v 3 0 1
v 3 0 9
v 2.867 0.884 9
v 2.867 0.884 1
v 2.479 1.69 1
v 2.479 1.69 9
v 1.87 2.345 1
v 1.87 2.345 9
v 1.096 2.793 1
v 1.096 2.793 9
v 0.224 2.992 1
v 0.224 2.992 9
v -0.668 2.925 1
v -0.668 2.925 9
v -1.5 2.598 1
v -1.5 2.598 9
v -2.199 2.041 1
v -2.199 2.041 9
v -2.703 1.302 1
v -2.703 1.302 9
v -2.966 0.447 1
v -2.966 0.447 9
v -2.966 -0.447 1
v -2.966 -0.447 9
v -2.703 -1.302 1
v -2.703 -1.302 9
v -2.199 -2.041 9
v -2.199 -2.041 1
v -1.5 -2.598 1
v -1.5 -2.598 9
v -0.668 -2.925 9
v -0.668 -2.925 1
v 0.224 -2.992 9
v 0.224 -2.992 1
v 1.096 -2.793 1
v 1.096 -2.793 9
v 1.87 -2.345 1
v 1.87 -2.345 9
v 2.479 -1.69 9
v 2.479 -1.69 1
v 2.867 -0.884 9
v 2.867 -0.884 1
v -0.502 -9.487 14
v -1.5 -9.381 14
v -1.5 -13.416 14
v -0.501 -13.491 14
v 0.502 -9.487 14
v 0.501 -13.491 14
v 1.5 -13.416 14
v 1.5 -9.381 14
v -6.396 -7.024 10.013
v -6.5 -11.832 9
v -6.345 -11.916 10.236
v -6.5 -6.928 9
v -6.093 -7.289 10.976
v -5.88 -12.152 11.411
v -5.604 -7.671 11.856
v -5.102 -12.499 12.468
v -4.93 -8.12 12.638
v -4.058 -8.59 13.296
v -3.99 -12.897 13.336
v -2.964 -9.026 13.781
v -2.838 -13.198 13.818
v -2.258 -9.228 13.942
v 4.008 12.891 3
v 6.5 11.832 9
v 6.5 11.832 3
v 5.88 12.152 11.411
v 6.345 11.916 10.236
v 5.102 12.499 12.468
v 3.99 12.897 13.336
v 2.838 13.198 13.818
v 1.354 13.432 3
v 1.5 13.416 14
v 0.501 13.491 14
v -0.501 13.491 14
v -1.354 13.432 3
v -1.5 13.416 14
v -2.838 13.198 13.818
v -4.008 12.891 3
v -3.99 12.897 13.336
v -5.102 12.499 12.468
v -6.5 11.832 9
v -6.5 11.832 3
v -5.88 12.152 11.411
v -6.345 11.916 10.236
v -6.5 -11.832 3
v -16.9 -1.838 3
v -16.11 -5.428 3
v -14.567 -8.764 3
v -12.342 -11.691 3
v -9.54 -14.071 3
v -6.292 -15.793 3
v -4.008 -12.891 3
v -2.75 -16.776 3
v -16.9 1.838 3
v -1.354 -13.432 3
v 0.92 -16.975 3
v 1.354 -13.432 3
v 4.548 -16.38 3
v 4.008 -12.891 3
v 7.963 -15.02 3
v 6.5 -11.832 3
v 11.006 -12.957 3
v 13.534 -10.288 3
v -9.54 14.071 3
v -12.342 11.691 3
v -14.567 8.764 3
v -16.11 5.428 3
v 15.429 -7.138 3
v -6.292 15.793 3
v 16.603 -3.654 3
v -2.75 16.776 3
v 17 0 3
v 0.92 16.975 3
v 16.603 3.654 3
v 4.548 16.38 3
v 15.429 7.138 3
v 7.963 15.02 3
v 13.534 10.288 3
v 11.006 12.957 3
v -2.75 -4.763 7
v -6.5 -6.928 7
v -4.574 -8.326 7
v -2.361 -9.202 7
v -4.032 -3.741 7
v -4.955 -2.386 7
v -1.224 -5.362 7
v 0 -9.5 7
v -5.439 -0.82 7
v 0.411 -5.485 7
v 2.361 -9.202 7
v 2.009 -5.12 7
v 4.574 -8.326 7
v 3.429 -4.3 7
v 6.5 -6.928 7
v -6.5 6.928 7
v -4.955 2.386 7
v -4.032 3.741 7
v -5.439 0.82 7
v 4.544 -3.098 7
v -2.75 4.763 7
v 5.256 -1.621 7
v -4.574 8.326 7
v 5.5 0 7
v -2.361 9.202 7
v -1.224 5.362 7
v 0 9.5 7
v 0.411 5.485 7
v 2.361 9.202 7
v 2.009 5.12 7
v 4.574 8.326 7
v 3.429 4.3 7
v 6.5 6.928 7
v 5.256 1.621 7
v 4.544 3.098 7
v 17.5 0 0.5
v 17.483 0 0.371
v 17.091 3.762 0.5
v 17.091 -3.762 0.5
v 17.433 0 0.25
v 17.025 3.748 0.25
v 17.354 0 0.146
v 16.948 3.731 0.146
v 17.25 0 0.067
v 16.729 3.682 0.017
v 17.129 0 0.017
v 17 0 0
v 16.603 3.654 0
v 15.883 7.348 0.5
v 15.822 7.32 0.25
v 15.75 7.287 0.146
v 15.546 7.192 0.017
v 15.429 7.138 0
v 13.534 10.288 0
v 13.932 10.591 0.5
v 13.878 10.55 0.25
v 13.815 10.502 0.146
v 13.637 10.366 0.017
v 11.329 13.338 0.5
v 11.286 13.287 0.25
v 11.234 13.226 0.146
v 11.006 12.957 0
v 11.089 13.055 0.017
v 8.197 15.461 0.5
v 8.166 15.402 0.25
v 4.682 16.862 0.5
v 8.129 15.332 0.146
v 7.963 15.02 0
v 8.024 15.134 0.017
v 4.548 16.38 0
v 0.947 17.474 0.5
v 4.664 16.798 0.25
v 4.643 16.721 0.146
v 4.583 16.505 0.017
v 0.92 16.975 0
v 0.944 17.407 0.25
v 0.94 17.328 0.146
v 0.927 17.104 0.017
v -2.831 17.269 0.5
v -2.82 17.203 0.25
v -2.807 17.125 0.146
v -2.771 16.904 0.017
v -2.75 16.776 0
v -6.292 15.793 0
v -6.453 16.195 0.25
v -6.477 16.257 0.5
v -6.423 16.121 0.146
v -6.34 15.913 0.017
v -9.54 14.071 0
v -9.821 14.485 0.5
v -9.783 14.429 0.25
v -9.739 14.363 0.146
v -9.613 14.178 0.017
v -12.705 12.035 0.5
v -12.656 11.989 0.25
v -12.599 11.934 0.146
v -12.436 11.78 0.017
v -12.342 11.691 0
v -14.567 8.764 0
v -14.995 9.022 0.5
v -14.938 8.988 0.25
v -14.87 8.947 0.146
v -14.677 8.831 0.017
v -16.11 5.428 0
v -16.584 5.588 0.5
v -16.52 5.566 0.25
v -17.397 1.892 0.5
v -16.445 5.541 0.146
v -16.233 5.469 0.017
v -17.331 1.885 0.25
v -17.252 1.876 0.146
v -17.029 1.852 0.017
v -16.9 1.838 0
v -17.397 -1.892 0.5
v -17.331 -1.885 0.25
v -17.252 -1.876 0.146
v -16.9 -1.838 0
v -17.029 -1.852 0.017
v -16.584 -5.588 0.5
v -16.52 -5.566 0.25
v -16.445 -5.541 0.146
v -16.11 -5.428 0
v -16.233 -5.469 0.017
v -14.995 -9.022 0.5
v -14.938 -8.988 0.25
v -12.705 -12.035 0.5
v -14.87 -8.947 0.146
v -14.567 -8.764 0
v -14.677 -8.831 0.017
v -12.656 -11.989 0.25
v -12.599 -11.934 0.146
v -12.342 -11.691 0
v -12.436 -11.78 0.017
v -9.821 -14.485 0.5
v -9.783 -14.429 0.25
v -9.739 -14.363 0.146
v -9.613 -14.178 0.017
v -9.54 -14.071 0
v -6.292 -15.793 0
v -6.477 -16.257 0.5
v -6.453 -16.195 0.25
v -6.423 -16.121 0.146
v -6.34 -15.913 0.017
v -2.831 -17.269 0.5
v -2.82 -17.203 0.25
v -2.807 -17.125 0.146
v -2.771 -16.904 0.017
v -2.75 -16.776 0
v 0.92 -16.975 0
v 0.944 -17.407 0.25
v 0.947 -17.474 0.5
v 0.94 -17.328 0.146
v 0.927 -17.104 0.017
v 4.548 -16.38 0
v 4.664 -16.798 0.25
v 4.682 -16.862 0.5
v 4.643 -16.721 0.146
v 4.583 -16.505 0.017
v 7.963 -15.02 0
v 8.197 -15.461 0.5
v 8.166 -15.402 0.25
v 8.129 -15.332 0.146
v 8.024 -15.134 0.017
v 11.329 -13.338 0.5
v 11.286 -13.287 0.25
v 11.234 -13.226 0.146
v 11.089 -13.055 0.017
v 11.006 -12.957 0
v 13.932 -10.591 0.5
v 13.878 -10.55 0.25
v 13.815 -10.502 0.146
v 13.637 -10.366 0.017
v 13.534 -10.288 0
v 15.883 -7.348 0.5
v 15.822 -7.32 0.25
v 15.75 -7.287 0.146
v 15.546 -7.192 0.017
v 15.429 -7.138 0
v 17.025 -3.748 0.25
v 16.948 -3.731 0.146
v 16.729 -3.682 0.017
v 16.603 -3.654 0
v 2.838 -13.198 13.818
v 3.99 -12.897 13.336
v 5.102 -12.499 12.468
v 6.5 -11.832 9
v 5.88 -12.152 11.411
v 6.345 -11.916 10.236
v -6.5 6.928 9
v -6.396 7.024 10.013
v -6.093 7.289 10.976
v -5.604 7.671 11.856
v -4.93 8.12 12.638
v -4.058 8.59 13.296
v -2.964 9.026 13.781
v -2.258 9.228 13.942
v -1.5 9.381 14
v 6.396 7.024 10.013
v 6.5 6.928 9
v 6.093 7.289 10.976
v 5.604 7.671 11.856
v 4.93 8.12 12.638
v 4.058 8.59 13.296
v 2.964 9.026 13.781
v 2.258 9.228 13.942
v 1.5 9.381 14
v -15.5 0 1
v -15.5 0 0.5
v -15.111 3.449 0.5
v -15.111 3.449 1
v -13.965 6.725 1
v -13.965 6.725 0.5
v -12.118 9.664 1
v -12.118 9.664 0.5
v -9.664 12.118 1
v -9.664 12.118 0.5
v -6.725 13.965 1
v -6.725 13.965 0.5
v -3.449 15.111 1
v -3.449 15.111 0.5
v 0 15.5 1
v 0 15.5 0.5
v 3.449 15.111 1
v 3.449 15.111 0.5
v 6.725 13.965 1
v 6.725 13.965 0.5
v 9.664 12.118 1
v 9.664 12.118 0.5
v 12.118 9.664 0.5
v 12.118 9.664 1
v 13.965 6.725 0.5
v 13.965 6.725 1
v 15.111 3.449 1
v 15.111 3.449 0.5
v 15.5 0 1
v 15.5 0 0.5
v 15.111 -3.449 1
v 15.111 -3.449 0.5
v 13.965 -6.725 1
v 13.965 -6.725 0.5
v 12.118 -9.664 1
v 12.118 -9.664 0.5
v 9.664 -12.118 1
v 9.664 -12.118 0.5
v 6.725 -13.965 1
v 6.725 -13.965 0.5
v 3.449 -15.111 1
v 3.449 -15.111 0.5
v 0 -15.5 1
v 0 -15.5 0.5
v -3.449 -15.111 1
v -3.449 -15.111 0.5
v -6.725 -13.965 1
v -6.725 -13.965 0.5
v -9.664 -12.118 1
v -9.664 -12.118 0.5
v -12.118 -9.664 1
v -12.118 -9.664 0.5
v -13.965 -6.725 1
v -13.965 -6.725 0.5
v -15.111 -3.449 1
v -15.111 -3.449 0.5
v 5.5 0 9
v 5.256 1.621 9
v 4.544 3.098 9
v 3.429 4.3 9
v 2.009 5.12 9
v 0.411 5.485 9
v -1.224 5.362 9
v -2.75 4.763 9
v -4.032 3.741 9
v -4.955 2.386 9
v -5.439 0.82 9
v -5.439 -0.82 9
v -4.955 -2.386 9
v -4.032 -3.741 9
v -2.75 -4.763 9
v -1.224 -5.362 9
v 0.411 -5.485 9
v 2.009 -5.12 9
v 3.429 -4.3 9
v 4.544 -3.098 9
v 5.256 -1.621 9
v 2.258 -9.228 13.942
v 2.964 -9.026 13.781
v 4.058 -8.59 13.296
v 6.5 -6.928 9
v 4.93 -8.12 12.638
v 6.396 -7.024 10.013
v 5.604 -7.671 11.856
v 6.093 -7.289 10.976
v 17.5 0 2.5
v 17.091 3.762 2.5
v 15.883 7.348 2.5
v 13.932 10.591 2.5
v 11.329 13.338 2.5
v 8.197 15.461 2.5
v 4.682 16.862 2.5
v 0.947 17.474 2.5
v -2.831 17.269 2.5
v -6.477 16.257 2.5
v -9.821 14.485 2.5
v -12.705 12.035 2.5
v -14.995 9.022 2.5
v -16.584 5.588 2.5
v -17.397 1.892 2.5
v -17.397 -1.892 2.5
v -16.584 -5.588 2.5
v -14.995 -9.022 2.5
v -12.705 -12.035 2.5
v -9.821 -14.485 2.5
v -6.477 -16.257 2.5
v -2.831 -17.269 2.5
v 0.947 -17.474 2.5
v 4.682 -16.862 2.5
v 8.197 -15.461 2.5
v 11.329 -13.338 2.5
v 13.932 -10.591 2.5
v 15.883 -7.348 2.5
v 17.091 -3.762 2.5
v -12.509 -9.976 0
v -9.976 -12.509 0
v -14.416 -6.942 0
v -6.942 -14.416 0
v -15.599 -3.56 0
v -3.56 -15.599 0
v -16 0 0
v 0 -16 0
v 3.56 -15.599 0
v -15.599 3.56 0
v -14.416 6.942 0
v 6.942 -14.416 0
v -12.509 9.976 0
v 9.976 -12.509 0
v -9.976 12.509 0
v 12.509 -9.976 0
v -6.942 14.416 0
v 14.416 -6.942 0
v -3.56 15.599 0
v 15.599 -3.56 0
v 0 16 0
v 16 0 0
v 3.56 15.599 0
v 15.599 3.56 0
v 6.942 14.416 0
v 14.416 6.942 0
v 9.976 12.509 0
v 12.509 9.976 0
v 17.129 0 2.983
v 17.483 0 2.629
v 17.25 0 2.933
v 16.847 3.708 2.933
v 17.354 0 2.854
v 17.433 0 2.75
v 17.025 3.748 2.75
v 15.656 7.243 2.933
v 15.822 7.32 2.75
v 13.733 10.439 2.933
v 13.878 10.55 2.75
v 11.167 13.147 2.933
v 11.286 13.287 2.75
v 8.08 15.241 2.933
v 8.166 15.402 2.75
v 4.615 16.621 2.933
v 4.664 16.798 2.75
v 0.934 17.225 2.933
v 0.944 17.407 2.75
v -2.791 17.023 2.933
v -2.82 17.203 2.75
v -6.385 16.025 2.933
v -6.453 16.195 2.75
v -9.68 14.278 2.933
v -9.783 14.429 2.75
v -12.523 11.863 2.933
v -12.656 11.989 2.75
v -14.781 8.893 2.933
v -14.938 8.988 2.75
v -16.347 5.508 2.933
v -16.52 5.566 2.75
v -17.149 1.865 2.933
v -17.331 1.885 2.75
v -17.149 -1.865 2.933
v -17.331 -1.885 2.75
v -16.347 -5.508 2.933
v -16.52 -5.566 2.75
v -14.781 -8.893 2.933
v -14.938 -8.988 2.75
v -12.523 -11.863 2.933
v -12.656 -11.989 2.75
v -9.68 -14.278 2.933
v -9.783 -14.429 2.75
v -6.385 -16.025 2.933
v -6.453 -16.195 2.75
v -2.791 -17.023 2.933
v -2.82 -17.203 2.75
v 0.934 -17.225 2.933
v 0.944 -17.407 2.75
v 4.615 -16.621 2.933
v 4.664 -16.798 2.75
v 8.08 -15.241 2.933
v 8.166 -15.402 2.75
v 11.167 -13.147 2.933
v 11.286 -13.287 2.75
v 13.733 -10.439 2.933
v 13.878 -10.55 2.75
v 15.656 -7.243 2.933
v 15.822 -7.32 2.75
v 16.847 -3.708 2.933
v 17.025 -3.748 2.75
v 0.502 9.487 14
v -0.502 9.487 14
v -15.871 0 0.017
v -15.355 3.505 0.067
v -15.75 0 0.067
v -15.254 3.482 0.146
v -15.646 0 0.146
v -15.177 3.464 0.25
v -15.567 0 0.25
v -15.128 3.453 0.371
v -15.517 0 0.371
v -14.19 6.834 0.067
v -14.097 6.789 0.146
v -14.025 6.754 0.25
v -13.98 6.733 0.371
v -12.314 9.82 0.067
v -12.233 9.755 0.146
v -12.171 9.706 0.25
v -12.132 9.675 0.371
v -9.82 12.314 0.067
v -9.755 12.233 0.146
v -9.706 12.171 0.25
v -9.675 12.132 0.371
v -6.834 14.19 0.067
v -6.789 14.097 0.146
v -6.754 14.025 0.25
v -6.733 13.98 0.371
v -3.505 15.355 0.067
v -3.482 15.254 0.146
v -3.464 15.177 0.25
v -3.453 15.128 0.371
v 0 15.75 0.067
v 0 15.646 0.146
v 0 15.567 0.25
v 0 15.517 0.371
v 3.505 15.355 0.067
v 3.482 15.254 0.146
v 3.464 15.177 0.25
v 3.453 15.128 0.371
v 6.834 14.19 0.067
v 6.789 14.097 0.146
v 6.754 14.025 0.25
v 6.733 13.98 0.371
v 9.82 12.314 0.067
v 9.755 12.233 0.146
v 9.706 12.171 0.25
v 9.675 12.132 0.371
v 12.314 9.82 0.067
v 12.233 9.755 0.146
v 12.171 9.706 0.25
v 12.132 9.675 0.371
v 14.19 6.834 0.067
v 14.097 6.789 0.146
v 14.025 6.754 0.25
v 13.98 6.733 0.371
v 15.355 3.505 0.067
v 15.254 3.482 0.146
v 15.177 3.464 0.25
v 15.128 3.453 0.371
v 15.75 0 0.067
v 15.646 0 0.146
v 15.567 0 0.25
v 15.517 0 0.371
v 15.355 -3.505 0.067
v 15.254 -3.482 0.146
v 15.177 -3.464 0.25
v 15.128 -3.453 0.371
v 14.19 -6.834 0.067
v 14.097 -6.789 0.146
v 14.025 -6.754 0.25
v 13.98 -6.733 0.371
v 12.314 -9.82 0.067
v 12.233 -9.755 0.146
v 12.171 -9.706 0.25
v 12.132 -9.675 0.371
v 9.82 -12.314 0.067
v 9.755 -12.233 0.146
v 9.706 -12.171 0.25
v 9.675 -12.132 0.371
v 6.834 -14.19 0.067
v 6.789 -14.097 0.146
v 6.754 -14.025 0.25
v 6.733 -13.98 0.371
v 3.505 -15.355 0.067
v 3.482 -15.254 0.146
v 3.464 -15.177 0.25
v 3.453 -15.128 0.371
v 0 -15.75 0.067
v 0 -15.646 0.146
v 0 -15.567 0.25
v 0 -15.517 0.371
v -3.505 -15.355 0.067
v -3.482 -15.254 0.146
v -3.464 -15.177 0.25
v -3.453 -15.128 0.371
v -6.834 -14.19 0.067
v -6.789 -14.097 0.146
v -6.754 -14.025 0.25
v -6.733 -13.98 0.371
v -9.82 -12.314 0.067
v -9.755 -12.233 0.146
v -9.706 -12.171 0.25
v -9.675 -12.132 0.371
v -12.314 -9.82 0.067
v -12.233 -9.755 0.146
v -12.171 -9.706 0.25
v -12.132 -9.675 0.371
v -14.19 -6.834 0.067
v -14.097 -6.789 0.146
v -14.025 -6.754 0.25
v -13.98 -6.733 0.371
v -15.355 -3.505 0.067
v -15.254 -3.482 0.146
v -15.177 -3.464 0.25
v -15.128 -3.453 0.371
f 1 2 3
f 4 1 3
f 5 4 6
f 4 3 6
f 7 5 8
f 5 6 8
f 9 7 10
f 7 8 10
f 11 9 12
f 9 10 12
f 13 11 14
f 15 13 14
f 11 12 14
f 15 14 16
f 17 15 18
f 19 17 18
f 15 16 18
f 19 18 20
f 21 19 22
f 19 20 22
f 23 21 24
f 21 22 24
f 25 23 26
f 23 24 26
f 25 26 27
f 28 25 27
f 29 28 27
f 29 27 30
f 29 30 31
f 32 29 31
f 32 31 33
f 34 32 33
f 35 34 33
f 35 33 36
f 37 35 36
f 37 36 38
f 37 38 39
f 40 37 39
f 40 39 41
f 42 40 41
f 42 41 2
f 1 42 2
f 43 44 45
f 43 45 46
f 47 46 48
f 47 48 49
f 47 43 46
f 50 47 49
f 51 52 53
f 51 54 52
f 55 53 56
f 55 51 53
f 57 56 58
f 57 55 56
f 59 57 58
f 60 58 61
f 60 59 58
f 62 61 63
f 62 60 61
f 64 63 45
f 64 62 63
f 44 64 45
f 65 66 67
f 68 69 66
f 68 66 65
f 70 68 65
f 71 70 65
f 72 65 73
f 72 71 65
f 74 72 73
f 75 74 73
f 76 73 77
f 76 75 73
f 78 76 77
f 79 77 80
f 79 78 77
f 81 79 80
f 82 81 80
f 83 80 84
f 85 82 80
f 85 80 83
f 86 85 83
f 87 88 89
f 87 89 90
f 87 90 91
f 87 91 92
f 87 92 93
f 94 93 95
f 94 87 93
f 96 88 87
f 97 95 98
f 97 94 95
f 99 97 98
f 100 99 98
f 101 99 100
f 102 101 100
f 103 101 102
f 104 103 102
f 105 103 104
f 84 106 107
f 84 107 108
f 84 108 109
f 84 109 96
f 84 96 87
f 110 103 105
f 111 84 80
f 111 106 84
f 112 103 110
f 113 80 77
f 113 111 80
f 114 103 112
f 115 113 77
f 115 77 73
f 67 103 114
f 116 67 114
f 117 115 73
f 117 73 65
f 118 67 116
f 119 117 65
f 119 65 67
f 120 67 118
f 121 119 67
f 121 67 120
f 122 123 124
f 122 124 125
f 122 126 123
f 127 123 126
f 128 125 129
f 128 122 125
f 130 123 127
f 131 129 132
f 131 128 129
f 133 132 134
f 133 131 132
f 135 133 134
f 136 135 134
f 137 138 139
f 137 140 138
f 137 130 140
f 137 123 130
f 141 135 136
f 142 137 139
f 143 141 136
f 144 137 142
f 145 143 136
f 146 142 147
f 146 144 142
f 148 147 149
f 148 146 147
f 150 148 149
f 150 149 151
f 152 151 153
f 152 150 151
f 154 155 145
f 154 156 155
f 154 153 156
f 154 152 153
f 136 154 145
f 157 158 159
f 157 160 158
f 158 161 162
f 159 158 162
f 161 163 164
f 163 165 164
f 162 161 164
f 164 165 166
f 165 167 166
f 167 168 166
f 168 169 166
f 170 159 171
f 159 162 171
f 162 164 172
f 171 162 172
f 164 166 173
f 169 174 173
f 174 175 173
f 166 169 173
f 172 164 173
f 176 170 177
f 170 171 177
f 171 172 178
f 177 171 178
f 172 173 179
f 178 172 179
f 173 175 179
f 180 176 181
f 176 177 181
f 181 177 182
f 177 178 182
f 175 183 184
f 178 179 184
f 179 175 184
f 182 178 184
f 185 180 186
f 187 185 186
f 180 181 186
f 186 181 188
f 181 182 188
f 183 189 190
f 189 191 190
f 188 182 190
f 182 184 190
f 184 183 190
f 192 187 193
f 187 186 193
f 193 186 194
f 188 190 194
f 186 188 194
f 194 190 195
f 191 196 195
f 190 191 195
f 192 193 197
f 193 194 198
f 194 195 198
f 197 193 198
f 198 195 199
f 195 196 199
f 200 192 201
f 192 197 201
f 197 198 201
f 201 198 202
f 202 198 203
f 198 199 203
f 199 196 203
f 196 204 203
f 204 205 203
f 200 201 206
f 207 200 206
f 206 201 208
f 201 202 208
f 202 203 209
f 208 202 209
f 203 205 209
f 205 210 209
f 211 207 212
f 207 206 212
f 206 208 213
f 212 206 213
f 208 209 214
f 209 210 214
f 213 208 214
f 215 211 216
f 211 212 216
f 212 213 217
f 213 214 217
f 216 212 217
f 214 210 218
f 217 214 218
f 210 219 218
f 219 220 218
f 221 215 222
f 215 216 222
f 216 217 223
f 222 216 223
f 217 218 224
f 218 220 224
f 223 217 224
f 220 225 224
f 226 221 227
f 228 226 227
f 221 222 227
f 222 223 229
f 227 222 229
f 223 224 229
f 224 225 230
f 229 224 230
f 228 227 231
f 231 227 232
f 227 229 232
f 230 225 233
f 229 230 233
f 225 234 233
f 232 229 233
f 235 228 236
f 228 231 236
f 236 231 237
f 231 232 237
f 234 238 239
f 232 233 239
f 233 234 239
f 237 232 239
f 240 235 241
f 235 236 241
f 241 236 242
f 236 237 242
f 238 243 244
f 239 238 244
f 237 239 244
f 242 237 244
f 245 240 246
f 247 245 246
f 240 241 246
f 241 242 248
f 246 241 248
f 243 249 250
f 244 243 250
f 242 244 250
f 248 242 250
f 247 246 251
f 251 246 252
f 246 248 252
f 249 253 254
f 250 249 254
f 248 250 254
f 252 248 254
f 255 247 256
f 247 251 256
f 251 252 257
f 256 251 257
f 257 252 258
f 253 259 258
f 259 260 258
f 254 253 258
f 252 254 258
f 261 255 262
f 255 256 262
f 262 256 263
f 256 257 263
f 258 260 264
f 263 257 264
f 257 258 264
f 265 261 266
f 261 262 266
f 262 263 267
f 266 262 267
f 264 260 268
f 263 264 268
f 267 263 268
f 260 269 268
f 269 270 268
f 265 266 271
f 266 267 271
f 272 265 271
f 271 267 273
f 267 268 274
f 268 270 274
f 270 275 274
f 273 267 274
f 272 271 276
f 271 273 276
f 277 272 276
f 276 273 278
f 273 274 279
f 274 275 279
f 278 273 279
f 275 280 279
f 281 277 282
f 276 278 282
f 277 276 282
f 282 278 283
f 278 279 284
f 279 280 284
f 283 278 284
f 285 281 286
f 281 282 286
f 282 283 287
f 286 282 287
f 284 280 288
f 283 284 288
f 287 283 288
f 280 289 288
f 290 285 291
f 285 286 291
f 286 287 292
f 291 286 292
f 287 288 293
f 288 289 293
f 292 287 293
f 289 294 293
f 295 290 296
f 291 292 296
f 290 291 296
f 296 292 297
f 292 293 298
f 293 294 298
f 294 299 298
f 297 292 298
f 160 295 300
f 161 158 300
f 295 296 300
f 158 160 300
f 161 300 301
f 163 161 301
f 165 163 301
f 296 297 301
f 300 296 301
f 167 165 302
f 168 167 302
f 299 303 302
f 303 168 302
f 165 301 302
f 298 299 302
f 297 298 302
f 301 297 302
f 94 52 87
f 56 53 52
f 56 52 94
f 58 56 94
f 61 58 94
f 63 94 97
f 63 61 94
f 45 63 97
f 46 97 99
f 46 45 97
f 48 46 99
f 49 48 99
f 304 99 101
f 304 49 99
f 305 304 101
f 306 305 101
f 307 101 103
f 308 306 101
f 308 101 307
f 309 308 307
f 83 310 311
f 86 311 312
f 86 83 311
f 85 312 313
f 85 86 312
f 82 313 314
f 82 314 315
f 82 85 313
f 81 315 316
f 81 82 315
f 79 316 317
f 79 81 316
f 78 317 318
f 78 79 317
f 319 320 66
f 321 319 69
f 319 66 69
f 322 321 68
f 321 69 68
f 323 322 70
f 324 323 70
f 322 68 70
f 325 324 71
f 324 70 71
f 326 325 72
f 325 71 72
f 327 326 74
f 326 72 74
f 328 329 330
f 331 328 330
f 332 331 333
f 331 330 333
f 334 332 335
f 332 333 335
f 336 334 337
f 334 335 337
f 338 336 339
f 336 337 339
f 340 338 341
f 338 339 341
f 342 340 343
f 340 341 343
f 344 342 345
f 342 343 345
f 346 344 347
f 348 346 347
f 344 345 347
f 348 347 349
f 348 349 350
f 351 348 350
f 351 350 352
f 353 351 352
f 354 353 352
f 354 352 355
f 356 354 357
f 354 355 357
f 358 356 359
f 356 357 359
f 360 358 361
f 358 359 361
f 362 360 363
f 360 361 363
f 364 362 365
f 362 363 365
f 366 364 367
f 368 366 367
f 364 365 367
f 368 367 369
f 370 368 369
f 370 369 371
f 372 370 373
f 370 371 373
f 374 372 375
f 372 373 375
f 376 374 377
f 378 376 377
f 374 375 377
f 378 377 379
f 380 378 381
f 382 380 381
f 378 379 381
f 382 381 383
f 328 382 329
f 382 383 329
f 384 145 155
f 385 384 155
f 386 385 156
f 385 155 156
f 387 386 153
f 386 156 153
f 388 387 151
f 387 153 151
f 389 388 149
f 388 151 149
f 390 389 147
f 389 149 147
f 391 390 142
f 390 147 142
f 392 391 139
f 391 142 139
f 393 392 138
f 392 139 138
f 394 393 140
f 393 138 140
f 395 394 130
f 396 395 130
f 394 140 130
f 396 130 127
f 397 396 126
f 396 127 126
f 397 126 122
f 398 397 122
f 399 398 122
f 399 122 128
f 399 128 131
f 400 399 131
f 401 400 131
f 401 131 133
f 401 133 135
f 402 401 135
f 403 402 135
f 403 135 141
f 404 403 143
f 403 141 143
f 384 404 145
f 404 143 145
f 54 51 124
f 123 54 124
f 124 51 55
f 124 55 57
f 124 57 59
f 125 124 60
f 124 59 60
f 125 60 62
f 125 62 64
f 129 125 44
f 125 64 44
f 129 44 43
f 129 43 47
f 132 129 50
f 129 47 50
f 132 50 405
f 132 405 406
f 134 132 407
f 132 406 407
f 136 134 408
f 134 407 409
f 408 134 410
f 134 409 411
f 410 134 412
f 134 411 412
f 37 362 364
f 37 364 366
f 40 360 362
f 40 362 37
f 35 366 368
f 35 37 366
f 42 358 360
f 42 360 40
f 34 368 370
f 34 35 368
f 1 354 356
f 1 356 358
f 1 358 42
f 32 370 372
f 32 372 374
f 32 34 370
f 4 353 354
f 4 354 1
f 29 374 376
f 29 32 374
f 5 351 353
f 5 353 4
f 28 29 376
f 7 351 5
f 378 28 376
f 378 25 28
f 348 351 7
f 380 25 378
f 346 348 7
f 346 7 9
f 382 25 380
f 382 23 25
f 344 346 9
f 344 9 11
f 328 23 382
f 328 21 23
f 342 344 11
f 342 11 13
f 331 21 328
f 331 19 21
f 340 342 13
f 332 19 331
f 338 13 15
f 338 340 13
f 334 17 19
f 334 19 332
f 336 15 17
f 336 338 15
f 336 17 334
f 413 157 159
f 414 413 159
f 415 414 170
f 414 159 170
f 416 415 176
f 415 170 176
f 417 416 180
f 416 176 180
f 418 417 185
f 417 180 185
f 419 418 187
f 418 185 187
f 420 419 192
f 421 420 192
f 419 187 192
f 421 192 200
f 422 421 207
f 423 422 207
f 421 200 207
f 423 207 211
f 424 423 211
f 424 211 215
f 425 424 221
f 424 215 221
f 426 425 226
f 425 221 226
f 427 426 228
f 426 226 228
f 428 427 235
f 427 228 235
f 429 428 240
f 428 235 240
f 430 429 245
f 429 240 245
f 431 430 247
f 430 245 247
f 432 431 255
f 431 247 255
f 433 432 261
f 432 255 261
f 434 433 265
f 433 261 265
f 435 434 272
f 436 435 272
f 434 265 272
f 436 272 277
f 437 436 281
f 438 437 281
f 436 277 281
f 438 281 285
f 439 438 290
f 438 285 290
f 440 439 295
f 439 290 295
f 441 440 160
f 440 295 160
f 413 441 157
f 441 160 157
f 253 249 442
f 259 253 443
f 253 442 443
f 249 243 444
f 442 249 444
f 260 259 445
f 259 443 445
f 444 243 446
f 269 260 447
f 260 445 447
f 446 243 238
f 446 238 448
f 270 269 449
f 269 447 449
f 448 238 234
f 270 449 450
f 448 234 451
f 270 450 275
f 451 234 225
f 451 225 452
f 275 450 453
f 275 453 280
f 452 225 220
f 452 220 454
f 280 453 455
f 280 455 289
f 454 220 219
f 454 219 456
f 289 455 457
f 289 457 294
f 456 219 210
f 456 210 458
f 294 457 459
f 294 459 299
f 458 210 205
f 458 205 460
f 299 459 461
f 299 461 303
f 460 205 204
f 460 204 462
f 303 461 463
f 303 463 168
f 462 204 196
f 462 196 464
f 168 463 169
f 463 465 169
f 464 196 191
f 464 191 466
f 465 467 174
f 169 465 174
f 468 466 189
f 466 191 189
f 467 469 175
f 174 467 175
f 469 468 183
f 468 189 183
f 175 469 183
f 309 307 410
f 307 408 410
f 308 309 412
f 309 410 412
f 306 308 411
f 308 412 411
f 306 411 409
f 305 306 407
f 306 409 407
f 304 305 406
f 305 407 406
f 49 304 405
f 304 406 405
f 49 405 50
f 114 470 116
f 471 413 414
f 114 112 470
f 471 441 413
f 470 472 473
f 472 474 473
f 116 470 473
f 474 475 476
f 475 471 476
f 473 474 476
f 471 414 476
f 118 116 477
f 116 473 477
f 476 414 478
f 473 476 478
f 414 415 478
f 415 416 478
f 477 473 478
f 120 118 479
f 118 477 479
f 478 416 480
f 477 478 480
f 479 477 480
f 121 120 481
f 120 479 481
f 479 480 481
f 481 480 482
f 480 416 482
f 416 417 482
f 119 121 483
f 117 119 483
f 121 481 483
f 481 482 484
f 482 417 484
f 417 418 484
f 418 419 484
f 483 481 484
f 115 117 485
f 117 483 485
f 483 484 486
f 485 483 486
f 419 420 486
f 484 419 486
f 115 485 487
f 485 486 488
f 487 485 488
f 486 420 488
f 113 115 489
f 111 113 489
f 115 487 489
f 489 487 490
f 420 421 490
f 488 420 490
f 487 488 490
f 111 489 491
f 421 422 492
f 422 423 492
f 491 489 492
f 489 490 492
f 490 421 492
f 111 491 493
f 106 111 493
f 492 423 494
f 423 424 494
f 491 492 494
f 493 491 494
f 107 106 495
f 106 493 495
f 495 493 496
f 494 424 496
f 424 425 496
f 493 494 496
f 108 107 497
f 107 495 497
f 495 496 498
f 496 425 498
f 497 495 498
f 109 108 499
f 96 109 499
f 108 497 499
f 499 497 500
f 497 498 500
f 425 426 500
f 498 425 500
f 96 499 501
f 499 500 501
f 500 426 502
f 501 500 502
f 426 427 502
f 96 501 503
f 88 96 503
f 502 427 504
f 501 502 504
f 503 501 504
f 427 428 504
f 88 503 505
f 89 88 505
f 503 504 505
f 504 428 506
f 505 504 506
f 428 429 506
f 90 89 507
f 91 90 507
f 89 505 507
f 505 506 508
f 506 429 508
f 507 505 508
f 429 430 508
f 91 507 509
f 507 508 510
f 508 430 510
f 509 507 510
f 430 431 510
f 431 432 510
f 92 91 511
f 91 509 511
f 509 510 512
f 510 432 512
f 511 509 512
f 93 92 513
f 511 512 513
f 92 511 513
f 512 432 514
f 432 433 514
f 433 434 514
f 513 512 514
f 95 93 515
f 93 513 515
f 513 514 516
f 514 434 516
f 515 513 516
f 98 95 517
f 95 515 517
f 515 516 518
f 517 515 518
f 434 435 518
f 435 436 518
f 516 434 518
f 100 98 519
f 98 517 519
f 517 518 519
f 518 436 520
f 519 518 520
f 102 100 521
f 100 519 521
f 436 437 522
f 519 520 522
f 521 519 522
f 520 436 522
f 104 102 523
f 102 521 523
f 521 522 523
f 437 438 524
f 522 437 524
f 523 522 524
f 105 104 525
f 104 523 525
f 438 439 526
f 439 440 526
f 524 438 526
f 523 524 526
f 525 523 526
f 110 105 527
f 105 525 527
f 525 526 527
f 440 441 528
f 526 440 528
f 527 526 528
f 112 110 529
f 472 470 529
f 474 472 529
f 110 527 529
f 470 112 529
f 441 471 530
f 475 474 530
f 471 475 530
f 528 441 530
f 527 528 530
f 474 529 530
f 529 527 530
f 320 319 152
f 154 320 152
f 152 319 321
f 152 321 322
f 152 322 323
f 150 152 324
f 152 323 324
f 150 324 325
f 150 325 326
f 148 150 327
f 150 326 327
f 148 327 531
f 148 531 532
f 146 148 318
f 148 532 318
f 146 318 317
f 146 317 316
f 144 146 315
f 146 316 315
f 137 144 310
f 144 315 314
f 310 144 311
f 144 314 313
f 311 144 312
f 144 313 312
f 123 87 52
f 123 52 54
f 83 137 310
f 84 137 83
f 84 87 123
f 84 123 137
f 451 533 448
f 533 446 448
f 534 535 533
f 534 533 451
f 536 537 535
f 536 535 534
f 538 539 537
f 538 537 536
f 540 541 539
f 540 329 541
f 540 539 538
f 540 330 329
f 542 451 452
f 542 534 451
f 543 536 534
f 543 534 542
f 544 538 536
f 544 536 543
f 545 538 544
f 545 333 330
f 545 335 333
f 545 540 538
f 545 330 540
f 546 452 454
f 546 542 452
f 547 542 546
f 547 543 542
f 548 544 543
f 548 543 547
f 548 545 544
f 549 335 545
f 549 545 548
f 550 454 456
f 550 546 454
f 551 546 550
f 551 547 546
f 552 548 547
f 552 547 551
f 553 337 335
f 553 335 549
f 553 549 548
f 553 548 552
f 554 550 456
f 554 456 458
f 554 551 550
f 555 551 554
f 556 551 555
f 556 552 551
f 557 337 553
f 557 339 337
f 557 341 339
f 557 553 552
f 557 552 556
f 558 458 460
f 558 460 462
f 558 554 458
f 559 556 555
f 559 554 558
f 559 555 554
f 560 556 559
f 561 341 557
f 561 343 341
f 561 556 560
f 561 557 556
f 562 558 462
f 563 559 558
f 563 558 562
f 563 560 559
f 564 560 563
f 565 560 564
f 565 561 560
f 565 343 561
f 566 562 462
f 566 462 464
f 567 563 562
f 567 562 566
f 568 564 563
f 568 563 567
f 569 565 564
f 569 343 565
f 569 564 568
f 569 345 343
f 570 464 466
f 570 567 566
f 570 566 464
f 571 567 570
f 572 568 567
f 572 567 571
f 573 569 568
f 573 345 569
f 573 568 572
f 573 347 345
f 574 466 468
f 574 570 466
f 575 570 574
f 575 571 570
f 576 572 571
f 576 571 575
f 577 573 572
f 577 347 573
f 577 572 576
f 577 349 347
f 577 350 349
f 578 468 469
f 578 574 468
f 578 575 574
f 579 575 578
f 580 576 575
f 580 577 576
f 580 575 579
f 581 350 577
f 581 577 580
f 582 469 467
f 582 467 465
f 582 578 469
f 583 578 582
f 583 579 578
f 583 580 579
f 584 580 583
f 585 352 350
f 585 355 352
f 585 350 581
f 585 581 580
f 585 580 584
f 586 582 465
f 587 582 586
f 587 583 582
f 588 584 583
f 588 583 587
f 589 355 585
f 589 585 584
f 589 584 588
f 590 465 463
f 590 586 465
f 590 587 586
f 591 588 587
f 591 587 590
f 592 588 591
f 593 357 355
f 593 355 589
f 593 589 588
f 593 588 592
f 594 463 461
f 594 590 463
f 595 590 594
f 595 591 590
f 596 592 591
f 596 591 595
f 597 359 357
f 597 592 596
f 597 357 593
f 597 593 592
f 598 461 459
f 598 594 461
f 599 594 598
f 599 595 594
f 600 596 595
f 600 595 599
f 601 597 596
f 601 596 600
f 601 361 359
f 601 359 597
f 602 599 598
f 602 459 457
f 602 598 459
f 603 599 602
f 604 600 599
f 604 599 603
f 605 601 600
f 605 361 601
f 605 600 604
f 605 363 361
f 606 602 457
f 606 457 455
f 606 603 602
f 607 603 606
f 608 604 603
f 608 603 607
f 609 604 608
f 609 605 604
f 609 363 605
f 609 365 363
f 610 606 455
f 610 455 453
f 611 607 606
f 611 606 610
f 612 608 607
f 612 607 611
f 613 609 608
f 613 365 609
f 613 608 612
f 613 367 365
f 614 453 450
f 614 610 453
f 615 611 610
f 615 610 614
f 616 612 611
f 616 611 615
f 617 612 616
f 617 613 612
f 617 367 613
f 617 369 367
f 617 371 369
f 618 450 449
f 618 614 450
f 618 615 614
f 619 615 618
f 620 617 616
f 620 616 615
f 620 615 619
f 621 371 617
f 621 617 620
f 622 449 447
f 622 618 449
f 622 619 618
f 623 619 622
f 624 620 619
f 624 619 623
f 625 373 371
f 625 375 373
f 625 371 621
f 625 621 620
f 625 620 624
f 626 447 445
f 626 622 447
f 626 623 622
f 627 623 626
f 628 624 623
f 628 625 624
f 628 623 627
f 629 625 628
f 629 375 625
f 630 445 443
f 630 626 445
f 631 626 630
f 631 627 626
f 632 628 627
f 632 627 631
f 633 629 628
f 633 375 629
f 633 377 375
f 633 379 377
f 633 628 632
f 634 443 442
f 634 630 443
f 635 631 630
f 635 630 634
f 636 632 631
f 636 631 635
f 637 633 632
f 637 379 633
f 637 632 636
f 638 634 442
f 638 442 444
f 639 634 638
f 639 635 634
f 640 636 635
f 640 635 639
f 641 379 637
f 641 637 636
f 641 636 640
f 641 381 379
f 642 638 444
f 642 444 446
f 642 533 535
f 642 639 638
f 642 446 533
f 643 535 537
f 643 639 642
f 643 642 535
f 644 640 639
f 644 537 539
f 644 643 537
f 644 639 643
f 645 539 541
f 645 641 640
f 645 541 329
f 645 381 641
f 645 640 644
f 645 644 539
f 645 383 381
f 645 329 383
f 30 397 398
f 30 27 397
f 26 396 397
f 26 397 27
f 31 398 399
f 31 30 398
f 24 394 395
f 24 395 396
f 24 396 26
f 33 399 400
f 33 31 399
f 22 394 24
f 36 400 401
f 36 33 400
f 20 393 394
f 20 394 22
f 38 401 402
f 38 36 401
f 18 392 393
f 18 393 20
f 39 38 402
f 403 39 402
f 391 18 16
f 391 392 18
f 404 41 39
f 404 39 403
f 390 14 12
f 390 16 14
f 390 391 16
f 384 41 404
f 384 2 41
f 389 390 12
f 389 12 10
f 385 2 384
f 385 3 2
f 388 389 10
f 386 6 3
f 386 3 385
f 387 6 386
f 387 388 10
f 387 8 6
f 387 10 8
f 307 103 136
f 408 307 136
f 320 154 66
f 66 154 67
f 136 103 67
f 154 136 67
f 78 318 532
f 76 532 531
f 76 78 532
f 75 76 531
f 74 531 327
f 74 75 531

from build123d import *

# Parameters (mm, degrees)
SKETCH1_R           = 17.5
BOSS_EXTRUDE1_DEPTH = 3
SKETCH2_R           = 15.5
CUT_EXTRUDE1_DEPTH  = 1
SKETCH3_W           = 13
SKETCH3_H           = 28
BOSS_EXTRUDE2_DEPTH = 11
SKETCH4_R           = 9.5
CUT_EXTRUDE2_DEPTH  = 7
SKETCH5_R           = 16.54214052
SKETCH5_R_2         = 13.5
CUT_EXTRUDE3_DEPTH  = 11
FILLET1_R           = 5
SKETCH6_R           = 5.5
BOSS_EXTRUDE3_DEPTH = 2
SKETCH7_R           = 3
CUT_EXTRUDE4_DEPTH  = 27.334388165
FILLET3_R           = 0.5


with BuildPart() as part:
    # Sketch1 → Boss-Extrude1 (new body)
    with BuildSketch(Plane.XY):
        Circle(SKETCH1_R)
    extrude(amount=BOSS_EXTRUDE1_DEPTH)

    # Sketch2 → Cut-Extrude1 (cut)
    with BuildSketch(Plane(origin=(0, 0, 0), x_dir=(-1, 0, 0), z_dir=(0, 0, -1))):
        Circle(SKETCH2_R)
    extrude(amount=-CUT_EXTRUDE1_DEPTH, mode=Mode.SUBTRACT)

    # Sketch3 → Boss-Extrude2 (add)
    with BuildSketch(Plane.XY.offset(3)):
        Rectangle(SKETCH3_W, SKETCH3_H)
    extrude(amount=BOSS_EXTRUDE2_DEPTH)

    # Sketch4 → Cut-Extrude2 (cut)
    with BuildSketch(Plane.XY.offset(14)):
        Circle(SKETCH4_R)
    extrude(amount=-CUT_EXTRUDE2_DEPTH, mode=Mode.SUBTRACT)

    # Sketch5 → Cut-Extrude3 (cut)
    with BuildSketch(Plane.XY.offset(14)):
        Circle(SKETCH5_R)
        Circle(SKETCH5_R_2, mode=Mode.SUBTRACT)
    extrude(amount=-CUT_EXTRUDE3_DEPTH, mode=Mode.SUBTRACT)

    # Fillet1
    fillet1_edges = [part.edges().sort_by_distance(p)[0] for p in [
        (6.5, 9.380181398, 14),
        (-6.5, -9.380181398, 14),
        (6.5, -9.380181398, 14),
        (-6.5, 9.380181398, 14),
    ]]
    fillet(fillet1_edges, radius=FILLET1_R)

    # Sketch6 → Boss-Extrude3 (add)
    with BuildSketch(Plane.XY.offset(7)):
        Circle(SKETCH6_R)
    extrude(amount=BOSS_EXTRUDE3_DEPTH)

    # Sketch7 → Cut-Extrude4 (cut, through all)
    with BuildSketch(Plane.XY.offset(9)):
        Circle(SKETCH7_R)
    extrude(amount=-CUT_EXTRUDE4_DEPTH, mode=Mode.SUBTRACT)

    # Fillet3
    fillet3_edges = [part.edges().sort_by_distance(p)[0] for p in [
        (-17.5, 0, 0),
        (-17.5, 0, 3),
        (15.5, 0, 0),
    ]]
    fillet(fillet3_edges, radius=FILLET3_R)


solid = part.part
